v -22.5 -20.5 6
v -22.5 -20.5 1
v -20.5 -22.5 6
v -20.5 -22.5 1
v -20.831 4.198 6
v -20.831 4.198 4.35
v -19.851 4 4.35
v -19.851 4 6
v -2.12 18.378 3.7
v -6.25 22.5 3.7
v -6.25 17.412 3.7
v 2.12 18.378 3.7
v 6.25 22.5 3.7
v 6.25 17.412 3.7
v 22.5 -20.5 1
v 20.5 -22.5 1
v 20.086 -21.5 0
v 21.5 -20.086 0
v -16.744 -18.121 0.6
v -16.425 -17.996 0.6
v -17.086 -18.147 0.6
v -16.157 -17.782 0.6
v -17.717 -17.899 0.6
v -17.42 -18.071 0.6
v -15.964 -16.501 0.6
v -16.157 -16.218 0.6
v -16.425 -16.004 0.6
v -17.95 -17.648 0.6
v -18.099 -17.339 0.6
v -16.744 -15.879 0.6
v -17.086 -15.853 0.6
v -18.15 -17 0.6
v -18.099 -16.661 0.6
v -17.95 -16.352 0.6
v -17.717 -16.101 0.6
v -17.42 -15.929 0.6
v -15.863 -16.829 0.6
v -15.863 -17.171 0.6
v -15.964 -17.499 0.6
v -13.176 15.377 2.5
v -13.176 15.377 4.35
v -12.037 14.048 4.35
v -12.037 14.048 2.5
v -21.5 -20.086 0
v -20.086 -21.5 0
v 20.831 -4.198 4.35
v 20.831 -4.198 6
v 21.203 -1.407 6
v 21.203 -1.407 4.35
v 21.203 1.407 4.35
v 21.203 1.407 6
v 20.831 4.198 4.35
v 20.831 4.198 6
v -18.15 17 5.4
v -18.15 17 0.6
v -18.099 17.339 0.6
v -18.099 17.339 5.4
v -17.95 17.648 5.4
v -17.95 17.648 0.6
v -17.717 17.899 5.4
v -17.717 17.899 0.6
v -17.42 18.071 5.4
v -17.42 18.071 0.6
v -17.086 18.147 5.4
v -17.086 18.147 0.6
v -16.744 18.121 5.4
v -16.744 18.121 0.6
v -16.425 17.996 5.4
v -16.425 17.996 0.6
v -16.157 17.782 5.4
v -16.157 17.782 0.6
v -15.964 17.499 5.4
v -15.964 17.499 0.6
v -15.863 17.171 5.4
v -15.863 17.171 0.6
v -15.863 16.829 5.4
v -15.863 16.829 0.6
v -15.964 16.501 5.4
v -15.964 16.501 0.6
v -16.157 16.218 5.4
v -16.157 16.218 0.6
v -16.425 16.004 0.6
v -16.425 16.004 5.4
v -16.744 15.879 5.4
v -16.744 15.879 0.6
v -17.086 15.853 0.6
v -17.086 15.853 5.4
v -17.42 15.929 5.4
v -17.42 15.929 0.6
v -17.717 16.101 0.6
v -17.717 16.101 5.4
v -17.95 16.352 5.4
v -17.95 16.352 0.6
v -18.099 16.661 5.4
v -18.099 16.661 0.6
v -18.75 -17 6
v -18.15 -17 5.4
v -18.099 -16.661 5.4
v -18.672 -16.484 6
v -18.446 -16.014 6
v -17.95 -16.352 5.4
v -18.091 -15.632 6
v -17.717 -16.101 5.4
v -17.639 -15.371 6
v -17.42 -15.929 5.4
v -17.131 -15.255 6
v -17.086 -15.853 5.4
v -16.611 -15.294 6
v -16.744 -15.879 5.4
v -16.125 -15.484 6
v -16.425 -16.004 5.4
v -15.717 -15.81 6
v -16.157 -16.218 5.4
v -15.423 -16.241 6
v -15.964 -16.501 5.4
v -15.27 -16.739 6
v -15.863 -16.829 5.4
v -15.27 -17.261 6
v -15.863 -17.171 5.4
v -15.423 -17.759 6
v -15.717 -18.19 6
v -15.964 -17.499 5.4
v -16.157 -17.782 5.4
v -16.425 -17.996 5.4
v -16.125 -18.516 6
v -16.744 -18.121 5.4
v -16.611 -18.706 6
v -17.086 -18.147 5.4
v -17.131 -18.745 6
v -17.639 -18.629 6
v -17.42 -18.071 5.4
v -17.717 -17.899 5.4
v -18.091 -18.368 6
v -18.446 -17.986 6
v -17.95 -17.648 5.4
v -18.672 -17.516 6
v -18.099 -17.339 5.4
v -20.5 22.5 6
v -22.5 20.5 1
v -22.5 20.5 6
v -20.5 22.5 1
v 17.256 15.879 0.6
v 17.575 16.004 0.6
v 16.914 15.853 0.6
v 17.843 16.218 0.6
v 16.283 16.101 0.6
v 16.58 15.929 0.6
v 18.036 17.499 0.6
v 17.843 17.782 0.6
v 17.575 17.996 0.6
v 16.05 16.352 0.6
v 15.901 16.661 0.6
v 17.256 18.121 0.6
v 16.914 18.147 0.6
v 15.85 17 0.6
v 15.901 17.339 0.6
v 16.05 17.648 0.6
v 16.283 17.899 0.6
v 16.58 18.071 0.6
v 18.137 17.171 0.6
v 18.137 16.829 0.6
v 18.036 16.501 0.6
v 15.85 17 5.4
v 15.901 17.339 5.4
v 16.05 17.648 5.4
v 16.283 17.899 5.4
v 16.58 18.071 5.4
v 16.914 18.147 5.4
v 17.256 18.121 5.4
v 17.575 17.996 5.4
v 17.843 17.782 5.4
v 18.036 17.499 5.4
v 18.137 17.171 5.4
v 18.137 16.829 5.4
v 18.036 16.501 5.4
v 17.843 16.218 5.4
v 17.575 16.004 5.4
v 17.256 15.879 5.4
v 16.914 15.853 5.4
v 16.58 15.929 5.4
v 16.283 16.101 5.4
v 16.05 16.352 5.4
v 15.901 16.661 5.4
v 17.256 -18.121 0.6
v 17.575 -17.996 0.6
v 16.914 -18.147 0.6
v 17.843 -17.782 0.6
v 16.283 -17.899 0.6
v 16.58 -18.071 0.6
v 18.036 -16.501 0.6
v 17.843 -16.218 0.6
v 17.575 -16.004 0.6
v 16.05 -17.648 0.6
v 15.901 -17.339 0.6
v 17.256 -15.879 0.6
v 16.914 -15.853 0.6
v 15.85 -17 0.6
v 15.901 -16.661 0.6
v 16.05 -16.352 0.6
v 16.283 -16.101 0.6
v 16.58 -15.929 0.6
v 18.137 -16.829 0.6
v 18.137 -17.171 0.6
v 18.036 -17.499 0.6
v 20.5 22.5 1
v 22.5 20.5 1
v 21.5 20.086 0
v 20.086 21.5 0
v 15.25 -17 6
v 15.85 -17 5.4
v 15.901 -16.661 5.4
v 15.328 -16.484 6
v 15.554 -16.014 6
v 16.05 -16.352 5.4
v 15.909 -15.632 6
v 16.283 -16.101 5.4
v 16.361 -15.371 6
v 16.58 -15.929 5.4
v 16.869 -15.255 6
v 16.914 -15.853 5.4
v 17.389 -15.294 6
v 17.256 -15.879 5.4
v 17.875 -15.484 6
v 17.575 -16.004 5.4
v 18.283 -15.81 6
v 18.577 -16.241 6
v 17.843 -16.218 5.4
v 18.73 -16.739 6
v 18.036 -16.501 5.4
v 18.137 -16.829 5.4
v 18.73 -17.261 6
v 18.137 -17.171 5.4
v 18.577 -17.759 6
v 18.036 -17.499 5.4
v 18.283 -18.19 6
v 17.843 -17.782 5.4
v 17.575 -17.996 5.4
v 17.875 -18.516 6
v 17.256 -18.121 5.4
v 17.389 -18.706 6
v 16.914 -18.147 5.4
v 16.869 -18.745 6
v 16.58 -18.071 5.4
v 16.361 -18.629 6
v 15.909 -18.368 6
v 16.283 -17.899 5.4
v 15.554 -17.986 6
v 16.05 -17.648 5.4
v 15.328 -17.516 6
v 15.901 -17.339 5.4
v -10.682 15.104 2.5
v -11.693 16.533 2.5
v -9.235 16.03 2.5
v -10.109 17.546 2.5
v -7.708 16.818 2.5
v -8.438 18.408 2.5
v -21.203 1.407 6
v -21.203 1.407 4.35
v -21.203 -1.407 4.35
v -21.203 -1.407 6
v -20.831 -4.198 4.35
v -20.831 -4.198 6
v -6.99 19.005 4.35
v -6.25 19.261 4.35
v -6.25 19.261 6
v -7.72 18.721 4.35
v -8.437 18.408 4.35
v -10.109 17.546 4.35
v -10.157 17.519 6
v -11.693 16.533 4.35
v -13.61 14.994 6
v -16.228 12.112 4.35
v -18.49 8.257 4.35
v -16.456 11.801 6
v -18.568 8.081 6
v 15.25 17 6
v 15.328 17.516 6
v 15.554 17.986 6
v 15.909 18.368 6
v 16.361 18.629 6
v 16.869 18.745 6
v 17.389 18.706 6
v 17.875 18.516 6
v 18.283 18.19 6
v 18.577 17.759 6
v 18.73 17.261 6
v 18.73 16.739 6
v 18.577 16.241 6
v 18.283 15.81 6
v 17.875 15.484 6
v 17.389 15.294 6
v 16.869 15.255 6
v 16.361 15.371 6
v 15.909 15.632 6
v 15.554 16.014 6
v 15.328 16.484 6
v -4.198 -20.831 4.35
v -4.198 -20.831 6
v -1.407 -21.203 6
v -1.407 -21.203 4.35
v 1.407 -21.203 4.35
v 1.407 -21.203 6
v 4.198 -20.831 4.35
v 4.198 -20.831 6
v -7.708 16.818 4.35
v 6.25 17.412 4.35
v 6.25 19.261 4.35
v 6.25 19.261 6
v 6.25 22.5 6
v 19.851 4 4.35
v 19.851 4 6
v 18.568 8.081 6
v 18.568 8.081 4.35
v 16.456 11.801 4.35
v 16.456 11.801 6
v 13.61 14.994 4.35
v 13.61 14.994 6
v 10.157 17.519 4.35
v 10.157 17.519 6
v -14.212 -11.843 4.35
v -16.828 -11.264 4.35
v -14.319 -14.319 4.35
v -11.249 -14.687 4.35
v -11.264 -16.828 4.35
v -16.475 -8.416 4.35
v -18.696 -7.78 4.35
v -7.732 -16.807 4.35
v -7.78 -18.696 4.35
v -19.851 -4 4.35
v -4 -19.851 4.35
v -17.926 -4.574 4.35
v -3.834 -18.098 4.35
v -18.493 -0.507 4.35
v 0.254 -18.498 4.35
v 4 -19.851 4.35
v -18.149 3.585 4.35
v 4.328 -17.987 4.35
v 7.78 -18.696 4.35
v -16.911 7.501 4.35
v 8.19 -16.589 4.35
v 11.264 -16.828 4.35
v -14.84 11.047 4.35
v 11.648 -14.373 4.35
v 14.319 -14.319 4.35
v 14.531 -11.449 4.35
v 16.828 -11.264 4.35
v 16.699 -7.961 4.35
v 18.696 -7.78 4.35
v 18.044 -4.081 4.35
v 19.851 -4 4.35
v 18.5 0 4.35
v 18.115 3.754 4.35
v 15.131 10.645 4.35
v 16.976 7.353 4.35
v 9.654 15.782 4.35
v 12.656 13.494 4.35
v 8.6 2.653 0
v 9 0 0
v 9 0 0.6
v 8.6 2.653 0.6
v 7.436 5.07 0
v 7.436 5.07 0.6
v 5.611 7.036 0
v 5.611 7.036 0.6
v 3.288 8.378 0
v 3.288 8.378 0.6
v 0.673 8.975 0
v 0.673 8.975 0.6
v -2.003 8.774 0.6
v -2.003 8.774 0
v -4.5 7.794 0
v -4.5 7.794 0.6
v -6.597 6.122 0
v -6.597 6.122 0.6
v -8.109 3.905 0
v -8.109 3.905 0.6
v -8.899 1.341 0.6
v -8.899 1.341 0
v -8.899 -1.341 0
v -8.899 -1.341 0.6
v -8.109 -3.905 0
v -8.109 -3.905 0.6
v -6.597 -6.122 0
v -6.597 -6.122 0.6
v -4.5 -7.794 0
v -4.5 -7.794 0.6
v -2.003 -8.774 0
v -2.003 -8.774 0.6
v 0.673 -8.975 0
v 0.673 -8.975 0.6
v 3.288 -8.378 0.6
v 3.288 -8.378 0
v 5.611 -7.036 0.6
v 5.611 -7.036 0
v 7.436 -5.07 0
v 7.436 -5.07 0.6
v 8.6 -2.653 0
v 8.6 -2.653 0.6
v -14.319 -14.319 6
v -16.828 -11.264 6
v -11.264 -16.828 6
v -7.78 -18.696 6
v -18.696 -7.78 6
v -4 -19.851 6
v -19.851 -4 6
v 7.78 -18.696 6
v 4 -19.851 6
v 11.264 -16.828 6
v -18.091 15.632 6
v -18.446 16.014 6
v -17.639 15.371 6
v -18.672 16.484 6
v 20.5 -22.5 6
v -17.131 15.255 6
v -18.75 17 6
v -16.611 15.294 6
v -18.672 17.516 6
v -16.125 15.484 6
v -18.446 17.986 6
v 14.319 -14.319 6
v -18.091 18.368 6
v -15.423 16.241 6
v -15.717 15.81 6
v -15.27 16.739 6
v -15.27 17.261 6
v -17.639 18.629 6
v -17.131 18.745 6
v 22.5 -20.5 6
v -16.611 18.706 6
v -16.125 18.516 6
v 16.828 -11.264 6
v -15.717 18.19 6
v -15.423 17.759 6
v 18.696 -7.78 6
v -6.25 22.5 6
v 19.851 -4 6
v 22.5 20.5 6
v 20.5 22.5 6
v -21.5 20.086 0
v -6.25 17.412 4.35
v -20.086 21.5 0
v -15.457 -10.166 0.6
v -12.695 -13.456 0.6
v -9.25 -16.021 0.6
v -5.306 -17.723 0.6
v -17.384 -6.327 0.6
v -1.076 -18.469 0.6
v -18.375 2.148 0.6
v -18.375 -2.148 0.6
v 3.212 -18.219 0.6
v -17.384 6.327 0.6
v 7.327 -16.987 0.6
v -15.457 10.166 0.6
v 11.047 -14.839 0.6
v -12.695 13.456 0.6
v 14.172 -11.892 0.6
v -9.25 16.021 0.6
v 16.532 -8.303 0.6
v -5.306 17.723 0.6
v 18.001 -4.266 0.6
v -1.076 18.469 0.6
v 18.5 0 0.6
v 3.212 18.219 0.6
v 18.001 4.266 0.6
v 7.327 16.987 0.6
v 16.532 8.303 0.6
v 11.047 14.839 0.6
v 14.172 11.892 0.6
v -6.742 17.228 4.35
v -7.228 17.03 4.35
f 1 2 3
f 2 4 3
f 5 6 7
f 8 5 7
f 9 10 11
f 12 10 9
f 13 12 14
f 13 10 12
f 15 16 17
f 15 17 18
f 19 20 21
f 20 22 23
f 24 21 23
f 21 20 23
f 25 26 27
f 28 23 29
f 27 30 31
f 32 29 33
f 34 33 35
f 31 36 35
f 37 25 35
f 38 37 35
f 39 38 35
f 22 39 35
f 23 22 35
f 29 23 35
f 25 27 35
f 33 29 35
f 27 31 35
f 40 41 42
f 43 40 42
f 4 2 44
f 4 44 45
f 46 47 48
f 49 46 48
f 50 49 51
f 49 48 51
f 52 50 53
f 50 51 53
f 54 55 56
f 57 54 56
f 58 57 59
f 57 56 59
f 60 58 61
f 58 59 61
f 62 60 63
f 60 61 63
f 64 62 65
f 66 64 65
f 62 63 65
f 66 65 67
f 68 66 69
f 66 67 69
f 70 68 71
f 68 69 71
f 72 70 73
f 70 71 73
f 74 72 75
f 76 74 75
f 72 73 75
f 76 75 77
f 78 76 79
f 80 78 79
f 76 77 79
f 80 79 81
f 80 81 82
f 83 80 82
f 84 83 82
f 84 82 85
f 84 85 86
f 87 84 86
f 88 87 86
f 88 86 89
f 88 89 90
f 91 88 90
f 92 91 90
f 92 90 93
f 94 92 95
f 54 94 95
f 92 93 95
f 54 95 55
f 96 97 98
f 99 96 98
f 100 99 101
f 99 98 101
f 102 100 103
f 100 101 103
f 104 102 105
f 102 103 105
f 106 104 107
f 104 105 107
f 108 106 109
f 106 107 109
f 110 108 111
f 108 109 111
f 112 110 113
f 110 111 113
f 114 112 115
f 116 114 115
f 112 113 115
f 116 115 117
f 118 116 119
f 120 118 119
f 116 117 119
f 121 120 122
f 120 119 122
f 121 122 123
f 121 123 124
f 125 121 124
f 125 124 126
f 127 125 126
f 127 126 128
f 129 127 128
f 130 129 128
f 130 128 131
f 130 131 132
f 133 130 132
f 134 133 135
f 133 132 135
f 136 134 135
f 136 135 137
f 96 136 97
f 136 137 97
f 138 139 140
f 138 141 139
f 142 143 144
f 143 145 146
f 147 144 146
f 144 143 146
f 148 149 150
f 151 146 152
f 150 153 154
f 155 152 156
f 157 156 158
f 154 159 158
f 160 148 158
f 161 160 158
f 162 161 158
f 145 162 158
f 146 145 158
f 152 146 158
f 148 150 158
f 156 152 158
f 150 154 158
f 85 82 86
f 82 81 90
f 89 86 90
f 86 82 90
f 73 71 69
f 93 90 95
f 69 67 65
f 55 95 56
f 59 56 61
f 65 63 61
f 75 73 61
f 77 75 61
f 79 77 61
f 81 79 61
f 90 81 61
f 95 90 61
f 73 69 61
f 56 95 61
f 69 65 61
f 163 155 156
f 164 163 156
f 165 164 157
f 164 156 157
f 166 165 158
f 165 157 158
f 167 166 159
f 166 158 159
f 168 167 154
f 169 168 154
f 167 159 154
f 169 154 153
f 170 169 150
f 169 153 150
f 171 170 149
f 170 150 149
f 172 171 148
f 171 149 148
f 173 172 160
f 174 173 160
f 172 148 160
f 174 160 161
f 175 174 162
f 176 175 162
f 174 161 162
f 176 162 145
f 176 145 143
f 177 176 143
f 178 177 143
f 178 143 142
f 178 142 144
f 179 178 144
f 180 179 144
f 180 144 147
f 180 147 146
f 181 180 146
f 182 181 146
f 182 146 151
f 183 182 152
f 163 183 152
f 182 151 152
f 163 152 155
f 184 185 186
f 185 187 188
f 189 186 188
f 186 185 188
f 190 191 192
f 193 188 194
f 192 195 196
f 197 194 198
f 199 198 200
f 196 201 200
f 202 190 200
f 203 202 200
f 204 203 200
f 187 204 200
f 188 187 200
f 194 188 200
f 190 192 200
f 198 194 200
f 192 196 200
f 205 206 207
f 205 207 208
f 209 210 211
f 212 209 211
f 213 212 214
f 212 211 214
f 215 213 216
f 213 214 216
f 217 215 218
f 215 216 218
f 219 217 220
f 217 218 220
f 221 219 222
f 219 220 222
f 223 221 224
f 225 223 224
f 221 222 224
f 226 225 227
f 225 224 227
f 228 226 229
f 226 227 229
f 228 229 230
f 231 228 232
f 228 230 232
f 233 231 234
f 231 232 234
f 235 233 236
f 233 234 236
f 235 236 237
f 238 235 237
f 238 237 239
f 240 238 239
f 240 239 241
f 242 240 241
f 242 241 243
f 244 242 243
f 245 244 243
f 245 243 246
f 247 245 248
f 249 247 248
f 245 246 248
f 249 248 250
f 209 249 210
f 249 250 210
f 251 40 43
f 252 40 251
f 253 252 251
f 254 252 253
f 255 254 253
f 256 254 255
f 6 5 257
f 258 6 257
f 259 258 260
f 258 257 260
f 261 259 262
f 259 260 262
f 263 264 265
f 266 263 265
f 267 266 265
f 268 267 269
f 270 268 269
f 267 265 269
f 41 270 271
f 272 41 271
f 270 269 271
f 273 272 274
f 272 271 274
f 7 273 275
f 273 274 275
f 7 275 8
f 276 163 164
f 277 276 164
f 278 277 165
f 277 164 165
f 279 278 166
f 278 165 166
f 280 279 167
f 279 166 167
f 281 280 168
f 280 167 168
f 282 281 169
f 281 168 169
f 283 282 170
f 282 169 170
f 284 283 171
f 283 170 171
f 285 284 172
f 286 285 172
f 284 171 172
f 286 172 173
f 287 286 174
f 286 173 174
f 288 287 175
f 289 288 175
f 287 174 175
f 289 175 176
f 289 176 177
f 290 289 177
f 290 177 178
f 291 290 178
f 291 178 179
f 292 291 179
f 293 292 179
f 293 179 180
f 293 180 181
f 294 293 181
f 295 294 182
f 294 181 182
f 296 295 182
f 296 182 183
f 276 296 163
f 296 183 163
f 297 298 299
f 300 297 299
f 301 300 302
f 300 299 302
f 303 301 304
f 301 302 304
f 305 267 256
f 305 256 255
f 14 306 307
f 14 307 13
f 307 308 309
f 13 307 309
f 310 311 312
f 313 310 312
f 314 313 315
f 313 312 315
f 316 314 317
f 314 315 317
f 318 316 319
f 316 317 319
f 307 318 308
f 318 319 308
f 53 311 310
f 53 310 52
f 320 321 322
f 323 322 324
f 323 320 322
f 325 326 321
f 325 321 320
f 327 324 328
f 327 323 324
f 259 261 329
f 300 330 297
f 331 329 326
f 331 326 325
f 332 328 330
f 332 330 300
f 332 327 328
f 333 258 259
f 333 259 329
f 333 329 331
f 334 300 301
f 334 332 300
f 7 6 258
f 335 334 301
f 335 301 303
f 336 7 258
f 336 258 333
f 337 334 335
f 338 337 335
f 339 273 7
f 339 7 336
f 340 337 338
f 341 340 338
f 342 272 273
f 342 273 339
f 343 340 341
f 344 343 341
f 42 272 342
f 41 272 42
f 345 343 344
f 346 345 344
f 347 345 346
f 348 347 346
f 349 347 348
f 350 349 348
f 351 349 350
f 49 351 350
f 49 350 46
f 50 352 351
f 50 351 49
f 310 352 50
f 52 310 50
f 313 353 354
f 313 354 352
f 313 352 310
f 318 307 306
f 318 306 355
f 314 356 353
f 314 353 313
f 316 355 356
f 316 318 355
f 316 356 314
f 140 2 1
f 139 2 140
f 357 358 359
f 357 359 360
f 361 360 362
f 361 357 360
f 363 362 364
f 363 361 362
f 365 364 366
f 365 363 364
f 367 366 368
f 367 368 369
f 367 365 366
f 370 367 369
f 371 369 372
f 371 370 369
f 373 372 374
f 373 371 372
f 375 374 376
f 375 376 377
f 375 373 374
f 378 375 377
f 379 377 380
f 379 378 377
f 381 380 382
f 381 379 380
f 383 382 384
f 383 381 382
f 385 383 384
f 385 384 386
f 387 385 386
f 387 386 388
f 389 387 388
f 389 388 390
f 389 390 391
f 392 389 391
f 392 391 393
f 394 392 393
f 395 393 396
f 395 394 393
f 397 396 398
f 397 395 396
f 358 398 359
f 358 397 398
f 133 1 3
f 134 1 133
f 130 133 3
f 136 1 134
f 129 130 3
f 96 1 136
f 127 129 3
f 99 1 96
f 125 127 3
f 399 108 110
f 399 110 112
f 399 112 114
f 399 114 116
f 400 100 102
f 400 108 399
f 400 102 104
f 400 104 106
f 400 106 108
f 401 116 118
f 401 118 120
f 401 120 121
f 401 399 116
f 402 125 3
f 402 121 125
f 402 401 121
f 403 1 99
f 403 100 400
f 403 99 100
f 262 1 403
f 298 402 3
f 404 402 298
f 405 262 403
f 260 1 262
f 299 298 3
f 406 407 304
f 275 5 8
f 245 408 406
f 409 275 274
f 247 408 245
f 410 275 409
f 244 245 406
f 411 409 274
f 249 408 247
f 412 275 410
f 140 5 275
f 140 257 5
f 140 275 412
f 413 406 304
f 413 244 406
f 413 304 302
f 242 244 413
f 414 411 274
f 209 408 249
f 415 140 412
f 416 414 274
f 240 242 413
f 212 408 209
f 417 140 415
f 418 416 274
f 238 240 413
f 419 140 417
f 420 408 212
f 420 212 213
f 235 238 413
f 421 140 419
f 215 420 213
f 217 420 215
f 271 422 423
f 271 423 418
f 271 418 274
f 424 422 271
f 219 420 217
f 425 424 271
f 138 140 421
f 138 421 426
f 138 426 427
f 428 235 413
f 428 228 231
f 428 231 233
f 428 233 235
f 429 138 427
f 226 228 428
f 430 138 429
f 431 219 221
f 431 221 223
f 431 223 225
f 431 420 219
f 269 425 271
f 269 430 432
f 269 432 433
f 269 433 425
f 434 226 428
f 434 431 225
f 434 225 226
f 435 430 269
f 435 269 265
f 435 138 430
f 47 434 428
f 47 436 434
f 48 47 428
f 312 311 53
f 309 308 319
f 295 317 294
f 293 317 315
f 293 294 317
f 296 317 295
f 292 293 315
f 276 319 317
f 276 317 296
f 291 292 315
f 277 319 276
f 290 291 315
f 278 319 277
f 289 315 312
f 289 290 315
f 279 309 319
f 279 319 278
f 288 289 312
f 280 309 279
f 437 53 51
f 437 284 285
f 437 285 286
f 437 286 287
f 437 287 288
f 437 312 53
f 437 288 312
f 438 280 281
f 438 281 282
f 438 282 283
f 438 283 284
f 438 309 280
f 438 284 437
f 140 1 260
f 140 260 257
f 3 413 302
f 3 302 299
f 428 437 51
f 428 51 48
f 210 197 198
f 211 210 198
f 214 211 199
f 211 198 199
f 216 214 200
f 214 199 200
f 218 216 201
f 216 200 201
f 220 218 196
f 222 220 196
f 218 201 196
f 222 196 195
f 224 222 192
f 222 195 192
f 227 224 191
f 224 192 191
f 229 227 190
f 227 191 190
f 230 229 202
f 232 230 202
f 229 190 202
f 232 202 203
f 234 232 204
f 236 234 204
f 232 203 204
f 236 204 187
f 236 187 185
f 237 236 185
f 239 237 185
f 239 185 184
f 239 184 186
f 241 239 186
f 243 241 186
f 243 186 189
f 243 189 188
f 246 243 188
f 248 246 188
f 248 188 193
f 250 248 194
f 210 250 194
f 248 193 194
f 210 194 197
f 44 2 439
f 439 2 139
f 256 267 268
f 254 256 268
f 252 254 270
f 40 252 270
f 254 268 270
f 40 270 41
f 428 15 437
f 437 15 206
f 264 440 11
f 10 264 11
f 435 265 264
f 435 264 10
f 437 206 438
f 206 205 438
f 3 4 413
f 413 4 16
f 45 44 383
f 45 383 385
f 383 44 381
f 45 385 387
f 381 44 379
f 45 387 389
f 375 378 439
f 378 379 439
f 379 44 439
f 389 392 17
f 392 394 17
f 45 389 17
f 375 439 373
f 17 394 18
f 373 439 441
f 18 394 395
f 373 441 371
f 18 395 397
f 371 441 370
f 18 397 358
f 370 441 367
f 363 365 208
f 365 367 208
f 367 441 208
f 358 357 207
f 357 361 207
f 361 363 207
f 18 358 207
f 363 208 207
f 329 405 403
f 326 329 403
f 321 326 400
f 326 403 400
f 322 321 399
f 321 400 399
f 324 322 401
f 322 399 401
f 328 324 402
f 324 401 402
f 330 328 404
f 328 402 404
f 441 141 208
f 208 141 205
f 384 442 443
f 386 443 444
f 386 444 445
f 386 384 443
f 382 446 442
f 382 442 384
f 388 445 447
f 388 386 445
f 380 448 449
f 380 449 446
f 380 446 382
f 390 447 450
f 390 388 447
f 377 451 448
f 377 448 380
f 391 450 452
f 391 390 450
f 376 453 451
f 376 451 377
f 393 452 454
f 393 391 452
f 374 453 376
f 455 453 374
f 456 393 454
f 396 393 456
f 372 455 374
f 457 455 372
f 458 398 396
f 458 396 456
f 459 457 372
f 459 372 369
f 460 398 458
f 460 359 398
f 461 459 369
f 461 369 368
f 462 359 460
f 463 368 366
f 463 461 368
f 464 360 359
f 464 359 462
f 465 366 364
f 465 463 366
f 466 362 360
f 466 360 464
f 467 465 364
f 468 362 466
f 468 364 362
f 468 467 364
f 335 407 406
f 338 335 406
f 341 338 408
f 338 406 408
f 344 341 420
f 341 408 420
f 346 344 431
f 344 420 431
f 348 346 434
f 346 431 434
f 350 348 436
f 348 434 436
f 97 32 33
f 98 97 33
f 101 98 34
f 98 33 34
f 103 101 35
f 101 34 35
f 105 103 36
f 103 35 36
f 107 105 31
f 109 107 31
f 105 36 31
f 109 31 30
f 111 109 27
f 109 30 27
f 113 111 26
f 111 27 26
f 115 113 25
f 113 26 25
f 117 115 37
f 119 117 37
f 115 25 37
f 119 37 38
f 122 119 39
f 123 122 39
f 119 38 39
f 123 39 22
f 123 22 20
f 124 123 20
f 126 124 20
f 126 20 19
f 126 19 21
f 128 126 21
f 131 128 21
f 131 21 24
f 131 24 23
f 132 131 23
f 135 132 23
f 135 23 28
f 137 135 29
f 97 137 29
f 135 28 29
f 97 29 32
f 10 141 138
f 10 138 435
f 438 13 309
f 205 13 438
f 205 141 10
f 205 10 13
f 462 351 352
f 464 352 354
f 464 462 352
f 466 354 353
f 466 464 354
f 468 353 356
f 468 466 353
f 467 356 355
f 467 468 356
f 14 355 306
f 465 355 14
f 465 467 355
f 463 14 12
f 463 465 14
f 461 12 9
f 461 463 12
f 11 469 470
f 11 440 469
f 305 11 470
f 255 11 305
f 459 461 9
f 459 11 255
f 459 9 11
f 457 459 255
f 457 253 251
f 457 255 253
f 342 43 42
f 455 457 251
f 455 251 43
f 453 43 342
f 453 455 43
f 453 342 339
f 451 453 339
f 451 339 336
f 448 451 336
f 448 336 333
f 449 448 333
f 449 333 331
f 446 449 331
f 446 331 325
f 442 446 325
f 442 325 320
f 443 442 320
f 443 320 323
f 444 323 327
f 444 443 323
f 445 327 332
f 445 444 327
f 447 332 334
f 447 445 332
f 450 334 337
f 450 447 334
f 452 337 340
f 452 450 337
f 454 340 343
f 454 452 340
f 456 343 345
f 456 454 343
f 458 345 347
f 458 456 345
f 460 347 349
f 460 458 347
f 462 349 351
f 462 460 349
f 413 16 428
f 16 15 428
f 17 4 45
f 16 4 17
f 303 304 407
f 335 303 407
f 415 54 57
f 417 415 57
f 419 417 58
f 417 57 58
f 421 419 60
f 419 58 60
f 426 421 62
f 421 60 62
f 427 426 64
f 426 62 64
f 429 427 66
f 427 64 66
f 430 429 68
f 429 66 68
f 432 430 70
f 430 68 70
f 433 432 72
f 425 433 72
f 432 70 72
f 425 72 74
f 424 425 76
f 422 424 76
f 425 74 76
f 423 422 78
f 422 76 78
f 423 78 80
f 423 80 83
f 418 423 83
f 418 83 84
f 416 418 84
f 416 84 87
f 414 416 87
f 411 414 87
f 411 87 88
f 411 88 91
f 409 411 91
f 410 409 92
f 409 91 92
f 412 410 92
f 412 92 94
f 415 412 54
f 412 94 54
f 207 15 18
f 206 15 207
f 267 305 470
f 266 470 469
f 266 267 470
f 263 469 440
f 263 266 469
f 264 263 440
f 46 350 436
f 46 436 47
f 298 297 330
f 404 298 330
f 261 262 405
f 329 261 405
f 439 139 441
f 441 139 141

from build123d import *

# Parameters (mm, degrees)
SKETCH_W         = 45
SKETCH_H         = 45
SKETCH_R         = 18.5
PAD_DEPTH        = 6
SKETCH001_R      = 18.5
SKETCH001_R_2    = 9
PAD001_DEPTH     = 0.6
POCKET_DEPTH     = 5.65
HOLE_D           = 2.3
HOLE_DEPTH       = 9.4
HOLE_CSINK_D     = 3.5
HOLE_CSINK_ANGLE = 90
CHAMFER_SIZE     = 2
CHAMFER001_SIZE  = 1
SKETCH004_W      = 12.5
SKETCH004_H      = 25
POCKET002_DEPTH  = 6.3
POCKET006_DEPTH  = 7.5
CHAMFER003_SIZE  = 0.6


with BuildPart() as part:
    # Sketch → Pad (new body)
    with BuildSketch(Plane.XY):
        Rectangle(SKETCH_W, SKETCH_H)
        Circle(SKETCH_R, mode=Mode.SUBTRACT)
    extrude(amount=PAD_DEPTH)

    # Sketch001 → Pad001 (join)
    with BuildSketch(Plane.XY):
        Circle(SKETCH001_R)
        Circle(SKETCH001_R_2, mode=Mode.SUBTRACT)
    extrude(amount=PAD001_DEPTH)

    # Sketch002 → Pocket (cut)
    with BuildSketch(Plane.XY.offset(10)):
        with BuildLine():
            ThreePointArc((19.851008, 4), (0, 20.25), (-19.851008, 4))
            Line((-20.831304, 4.197531), (-19.851008, 4))
            ThreePointArc((-20.831304, 4.197531), (-21.25, 0), (-20.831304, -4.197531))
            Line((-20.831304, -4.197531), (-19.851008, -4))
            ThreePointArc((-19.851008, -4), (-14.318912, -14.318912), (-4, -19.851008))
            Line((-4.197531, -20.831304), (-4, -19.851008))
            ThreePointArc((-4.197531, -20.831304), (0, -21.25), (4.197531, -20.831304))
            Line((4.197531, -20.831304), (4, -19.851008))
            ThreePointArc((4, -19.851008), (14.318912, -14.318912), (19.851008, -4))
            Line((19.851008, -4), (20.831304, -4.197531))
            ThreePointArc((20.831304, -4.197531), (21.25, 0), (20.831304, 4.197531))
            Line((19.851008, 4), (20.831304, 4.197531))
        make_face()
    extrude(amount=-POCKET_DEPTH, mode=Mode.SUBTRACT)

    # Hole
    with Locations(Plane.XY.offset(10)):
        with Locations((-17, 17), (-17, -17), (17, -17), (17, 17)):
            CounterSinkHole(HOLE_D / 2, HOLE_CSINK_D / 2, depth=HOLE_DEPTH, counter_sink_angle=HOLE_CSINK_ANGLE)

    # Chamfer
    chamfer_edges = [part.edges().sort_by_distance(p)[0] for p in [
        (22.5, -22.5, 3),
        (-22.5, -22.5, 3),
        (22.5, 22.5, 3),
        (-22.5, 22.5, 3),
    ]]
    chamfer(chamfer_edges, length=CHAMFER_SIZE)

    # Chamfer001
    chamfer001_edges = [part.edges().sort_by_distance(p)[0] for p in [
        (0, 22.5, 0),
        (-22.5, 0, 0),
        (-21.5, 21.5, 0),
        (22.5, 0, 0),
        (-21.5, -21.5, 0),
        (21.5, 21.5, 0),
        (0, -22.5, 0),
        (21.5, -21.5, 0),
    ]]
    chamfer(chamfer001_edges, length=CHAMFER001_SIZE)

    # Sketch004 → Pocket002 (cut)
    with BuildSketch(Plane.XY.offset(10)):
        with Locations((0, 12.5)):
            Rectangle(SKETCH004_W, SKETCH004_H)
    extrude(amount=-POCKET002_DEPTH, mode=Mode.SUBTRACT)

    # Sketch006 → Pocket006 (cut)
    with BuildSketch(Plane.XY.offset(10)):
        with BuildLine():
            Line((-13.175878, 15.377215), (-11.711892, 13.668635))
            ThreePointArc((-7.5, 16.363068), (-9.699958, 15.16281), (-11.711892, 13.668635))
            Line((-8.4375, 18.408452), (-7.5, 16.363068))
            ThreePointArc((-8.4375, 18.408452), (-10.912453, 17.058161), (-13.175878, 15.377215))
        make_face()
    extrude(amount=-POCKET006_DEPTH, mode=Mode.SUBTRACT)

    # Chamfer003
    chamfer003_edges = [part.edges().sort_by_distance(p)[0] for p in [
        (15.85, -17, 6),
        (-18.15, -17, 6),
        (-18.15, 17, 6),
        (15.85, 17, 6),
    ]]
    chamfer(chamfer003_edges, length=CHAMFER003_SIZE)


solid = part.part
